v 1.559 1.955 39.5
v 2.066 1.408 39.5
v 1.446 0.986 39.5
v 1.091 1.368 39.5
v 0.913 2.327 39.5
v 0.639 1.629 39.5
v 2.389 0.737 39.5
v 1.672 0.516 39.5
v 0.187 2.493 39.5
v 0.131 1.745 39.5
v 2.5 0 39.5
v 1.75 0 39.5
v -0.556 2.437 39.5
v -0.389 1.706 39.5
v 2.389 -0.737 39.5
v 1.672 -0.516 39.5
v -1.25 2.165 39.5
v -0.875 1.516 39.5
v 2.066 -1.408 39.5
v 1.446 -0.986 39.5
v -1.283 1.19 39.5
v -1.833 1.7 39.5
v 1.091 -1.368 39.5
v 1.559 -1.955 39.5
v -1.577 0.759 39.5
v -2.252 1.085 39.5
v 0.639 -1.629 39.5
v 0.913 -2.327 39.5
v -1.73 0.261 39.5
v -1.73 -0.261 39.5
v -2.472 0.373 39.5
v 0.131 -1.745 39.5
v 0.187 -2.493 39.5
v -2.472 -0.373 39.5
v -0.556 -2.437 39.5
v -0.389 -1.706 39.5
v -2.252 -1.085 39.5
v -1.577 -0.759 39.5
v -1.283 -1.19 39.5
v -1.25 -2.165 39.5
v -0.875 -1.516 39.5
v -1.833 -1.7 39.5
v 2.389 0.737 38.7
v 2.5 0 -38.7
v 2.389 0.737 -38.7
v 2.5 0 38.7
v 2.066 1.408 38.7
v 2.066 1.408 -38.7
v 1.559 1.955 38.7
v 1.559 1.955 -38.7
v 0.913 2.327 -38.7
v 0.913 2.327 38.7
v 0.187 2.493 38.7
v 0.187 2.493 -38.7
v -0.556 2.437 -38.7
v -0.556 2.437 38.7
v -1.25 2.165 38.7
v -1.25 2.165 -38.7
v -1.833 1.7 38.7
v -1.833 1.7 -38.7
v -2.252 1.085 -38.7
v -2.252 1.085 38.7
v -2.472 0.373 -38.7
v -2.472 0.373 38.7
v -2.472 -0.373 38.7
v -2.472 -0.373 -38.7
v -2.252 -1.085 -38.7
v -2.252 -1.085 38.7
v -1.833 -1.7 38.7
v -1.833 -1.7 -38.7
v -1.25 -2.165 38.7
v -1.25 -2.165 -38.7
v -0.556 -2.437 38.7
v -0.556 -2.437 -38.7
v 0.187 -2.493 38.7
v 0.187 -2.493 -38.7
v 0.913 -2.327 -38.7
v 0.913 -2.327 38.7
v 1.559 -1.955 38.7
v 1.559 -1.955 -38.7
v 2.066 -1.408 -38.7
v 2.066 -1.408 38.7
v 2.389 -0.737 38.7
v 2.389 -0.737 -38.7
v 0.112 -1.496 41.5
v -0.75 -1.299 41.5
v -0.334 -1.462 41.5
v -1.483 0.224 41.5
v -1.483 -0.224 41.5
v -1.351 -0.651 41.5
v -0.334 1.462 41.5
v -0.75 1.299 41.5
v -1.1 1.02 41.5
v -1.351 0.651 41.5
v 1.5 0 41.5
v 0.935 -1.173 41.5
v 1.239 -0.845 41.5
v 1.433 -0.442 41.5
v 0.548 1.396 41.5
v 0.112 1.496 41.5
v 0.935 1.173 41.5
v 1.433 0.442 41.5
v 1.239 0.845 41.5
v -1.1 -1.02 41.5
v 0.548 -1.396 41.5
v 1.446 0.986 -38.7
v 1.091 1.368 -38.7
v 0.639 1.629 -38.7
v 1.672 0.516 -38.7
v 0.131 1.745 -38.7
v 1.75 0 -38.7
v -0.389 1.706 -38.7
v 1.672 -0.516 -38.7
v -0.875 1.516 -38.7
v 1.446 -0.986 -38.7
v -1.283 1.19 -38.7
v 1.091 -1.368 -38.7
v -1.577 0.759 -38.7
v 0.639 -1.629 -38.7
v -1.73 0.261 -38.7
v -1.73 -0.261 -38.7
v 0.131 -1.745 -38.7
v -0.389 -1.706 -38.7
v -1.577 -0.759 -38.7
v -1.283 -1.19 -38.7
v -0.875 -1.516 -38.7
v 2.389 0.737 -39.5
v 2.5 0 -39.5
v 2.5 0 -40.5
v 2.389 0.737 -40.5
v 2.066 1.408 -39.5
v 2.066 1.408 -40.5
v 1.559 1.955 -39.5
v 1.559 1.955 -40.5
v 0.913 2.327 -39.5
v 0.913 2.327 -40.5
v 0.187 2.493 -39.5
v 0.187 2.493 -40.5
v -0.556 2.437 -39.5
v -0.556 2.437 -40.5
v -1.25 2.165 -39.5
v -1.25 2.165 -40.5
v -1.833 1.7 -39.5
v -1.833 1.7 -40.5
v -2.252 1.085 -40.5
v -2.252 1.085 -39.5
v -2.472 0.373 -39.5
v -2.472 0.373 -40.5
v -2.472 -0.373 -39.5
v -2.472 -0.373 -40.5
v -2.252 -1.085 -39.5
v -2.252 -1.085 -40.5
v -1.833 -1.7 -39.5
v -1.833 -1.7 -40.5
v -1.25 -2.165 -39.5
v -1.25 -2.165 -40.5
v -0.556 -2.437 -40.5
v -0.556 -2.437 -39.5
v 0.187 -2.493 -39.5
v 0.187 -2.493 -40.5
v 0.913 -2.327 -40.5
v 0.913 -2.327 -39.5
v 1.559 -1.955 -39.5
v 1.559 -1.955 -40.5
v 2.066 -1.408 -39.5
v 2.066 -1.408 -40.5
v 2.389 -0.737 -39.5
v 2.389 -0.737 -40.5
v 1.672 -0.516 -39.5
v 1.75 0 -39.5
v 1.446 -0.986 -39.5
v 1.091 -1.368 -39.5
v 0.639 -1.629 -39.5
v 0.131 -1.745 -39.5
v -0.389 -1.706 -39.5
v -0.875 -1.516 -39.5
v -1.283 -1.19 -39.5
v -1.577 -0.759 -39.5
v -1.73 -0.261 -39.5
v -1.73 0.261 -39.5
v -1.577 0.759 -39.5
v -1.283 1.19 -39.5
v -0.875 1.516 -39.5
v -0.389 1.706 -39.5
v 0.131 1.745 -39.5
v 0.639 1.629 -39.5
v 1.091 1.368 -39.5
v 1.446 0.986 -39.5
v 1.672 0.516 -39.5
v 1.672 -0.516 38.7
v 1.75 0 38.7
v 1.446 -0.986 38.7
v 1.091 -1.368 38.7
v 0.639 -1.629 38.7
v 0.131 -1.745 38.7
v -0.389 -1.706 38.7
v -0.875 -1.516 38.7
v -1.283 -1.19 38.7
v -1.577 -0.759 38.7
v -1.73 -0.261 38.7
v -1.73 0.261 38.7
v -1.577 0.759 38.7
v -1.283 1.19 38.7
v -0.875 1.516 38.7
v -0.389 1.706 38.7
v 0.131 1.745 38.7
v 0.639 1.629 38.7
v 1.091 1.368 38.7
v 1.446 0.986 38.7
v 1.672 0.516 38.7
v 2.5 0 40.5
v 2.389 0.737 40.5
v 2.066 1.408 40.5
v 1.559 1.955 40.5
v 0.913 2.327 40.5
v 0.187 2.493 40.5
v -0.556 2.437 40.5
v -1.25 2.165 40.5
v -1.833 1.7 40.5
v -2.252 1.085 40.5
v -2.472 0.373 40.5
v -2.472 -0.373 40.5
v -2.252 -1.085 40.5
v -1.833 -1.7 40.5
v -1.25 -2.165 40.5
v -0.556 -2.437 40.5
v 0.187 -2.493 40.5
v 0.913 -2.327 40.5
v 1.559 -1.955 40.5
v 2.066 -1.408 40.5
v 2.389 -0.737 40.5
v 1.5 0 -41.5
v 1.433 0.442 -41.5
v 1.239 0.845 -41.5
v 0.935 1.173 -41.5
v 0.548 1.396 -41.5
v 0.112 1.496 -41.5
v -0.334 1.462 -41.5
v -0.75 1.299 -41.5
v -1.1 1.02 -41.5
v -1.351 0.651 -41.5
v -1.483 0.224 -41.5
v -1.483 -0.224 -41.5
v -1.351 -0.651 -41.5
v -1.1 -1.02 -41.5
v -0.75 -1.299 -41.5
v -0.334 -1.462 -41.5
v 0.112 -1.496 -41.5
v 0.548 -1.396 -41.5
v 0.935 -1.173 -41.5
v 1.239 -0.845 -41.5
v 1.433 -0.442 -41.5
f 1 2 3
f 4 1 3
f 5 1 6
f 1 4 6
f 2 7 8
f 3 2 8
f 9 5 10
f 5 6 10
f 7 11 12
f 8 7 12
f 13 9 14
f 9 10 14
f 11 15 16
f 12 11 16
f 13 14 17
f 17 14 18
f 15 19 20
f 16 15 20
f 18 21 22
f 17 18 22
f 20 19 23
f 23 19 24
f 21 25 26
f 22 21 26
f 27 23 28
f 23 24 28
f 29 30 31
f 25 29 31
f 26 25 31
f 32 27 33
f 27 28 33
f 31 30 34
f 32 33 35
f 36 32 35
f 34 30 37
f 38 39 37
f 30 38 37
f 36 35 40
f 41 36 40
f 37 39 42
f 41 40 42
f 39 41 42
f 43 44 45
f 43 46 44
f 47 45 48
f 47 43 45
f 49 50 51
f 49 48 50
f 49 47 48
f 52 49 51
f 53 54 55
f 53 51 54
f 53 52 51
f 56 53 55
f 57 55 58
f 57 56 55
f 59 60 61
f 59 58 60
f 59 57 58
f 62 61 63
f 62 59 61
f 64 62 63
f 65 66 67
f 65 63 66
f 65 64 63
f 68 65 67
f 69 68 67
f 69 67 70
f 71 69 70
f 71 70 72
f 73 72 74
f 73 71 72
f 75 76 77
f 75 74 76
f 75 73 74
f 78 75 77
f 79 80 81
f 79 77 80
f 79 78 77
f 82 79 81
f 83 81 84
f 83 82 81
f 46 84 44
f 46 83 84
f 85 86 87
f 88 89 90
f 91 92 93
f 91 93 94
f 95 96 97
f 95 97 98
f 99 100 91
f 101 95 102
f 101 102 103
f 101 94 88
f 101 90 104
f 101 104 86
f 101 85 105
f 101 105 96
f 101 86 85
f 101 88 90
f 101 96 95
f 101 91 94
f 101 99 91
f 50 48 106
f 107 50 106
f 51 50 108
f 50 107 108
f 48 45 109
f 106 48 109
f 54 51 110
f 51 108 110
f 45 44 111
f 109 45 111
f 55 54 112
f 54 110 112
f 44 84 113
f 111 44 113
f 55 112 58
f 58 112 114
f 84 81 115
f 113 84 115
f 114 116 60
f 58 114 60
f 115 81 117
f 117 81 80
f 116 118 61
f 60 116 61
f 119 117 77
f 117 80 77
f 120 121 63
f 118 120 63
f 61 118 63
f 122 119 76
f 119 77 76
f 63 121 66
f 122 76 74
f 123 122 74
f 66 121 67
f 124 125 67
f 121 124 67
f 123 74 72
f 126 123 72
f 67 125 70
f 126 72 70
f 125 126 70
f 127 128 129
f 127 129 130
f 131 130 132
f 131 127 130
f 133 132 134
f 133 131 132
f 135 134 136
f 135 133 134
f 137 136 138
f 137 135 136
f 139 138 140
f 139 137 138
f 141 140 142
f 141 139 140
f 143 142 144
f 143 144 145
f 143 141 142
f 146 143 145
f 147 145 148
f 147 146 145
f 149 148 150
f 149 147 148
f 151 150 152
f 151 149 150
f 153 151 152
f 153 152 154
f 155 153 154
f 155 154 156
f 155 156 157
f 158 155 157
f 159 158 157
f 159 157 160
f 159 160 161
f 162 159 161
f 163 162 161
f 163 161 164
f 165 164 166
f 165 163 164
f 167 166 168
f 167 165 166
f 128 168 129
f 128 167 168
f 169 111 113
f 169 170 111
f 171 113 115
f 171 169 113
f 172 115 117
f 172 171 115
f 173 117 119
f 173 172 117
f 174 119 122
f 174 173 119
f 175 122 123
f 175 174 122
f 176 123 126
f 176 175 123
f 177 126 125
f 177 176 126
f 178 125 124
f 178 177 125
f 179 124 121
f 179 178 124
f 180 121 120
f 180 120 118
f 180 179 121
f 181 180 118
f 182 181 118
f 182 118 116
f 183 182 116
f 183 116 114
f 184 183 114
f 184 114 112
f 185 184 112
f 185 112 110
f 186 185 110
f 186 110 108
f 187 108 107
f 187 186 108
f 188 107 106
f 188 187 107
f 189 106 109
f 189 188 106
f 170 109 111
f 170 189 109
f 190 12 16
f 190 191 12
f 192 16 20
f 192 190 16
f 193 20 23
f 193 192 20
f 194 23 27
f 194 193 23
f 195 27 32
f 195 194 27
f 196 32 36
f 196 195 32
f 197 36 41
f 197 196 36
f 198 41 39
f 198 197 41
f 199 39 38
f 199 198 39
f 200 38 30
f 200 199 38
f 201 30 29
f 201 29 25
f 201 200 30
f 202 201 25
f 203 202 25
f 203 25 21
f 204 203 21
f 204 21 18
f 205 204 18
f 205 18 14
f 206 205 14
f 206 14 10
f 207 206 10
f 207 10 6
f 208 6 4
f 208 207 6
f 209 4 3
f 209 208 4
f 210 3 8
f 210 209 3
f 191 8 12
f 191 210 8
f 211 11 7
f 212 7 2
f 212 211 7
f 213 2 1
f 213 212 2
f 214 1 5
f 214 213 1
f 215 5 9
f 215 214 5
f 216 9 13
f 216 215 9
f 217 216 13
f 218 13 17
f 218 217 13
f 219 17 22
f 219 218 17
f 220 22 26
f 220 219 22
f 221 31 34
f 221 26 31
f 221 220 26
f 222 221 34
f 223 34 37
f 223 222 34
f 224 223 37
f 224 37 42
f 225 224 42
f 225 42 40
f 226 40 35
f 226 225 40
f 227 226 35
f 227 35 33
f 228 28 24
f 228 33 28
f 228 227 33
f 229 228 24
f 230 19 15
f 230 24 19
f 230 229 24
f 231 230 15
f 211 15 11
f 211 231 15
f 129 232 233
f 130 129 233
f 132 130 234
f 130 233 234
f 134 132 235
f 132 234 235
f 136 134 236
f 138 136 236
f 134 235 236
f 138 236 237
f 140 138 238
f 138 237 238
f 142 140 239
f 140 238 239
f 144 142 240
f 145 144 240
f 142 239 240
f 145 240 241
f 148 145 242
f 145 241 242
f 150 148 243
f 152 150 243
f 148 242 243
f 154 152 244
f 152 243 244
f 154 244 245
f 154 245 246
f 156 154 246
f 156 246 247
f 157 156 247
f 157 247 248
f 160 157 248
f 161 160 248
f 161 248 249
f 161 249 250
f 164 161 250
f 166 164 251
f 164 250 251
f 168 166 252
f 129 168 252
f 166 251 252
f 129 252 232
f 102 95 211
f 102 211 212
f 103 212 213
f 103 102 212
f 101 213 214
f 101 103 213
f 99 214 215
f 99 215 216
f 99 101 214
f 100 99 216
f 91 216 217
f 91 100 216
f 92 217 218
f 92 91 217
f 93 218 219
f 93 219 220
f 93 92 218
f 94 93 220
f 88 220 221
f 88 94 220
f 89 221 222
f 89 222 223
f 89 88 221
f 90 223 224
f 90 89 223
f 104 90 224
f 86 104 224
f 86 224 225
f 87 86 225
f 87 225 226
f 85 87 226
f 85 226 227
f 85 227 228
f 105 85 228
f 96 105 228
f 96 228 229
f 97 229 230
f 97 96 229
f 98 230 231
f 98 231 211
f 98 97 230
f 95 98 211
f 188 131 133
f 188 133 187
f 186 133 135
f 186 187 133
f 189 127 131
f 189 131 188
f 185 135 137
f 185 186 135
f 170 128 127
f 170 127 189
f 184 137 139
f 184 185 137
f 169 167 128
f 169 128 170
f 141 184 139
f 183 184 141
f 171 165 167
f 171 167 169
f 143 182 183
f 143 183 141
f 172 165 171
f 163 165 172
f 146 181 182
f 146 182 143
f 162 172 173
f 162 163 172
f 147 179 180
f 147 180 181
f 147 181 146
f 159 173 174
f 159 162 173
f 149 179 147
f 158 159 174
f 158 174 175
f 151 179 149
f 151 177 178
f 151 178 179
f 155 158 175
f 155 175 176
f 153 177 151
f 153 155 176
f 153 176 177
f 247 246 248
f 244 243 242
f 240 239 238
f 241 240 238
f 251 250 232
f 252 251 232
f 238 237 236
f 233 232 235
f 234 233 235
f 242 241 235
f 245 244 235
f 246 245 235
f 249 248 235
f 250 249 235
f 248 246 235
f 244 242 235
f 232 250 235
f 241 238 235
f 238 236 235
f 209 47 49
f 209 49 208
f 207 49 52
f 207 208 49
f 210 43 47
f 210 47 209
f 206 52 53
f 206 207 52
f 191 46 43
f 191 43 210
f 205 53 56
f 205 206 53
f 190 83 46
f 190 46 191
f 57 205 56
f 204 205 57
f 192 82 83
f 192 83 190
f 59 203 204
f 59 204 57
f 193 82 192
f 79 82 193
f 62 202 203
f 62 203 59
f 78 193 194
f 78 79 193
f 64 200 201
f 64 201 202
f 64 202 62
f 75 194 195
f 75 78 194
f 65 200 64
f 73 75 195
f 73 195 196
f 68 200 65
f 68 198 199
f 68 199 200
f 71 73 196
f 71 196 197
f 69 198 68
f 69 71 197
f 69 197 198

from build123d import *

# Parameters (mm, degrees)
SKETCH_1_R      = 2.5
EXTRUDE_1_DEPTH = 41.5
SKETCH_2_W      = 0.75
SKETCH_2_H      = 0.8
CHAMFER_1_SIZE  = 1


with BuildPart() as part:
    # 草图1 → 凸台-拉伸1 (new, symmetric)
    with BuildSketch(Plane.XY):
        Circle(SKETCH_1_R)
    extrude(amount=EXTRUDE_1_DEPTH, both=True)

    # 草图2 → 切除-旋转1 (revolve, cut)
    with BuildSketch(Plane(origin=(0, 0, 0), x_dir=(1, 0, 0), z_dir=(0, 1, 0))):
        with Locations((2.125, 39.1)):
            Rectangle(SKETCH_2_W, SKETCH_2_H)
        with Locations((2.125, -39.1)):
            Rectangle(SKETCH_2_W, SKETCH_2_H)
    revolve(axis=Axis((0, 0, 49.423149105), (0, 0, -1)), mode=Mode.SUBTRACT)

    # 倒角1
    chamfer_1_edges = [part.edges().sort_by_distance(p)[0] for p in [
        (-2.5, 0, -41.5),
        (-2.5, 0, 41.5),
    ]]
    chamfer(chamfer_1_edges, length=CHAMFER_1_SIZE)


solid = part.part
